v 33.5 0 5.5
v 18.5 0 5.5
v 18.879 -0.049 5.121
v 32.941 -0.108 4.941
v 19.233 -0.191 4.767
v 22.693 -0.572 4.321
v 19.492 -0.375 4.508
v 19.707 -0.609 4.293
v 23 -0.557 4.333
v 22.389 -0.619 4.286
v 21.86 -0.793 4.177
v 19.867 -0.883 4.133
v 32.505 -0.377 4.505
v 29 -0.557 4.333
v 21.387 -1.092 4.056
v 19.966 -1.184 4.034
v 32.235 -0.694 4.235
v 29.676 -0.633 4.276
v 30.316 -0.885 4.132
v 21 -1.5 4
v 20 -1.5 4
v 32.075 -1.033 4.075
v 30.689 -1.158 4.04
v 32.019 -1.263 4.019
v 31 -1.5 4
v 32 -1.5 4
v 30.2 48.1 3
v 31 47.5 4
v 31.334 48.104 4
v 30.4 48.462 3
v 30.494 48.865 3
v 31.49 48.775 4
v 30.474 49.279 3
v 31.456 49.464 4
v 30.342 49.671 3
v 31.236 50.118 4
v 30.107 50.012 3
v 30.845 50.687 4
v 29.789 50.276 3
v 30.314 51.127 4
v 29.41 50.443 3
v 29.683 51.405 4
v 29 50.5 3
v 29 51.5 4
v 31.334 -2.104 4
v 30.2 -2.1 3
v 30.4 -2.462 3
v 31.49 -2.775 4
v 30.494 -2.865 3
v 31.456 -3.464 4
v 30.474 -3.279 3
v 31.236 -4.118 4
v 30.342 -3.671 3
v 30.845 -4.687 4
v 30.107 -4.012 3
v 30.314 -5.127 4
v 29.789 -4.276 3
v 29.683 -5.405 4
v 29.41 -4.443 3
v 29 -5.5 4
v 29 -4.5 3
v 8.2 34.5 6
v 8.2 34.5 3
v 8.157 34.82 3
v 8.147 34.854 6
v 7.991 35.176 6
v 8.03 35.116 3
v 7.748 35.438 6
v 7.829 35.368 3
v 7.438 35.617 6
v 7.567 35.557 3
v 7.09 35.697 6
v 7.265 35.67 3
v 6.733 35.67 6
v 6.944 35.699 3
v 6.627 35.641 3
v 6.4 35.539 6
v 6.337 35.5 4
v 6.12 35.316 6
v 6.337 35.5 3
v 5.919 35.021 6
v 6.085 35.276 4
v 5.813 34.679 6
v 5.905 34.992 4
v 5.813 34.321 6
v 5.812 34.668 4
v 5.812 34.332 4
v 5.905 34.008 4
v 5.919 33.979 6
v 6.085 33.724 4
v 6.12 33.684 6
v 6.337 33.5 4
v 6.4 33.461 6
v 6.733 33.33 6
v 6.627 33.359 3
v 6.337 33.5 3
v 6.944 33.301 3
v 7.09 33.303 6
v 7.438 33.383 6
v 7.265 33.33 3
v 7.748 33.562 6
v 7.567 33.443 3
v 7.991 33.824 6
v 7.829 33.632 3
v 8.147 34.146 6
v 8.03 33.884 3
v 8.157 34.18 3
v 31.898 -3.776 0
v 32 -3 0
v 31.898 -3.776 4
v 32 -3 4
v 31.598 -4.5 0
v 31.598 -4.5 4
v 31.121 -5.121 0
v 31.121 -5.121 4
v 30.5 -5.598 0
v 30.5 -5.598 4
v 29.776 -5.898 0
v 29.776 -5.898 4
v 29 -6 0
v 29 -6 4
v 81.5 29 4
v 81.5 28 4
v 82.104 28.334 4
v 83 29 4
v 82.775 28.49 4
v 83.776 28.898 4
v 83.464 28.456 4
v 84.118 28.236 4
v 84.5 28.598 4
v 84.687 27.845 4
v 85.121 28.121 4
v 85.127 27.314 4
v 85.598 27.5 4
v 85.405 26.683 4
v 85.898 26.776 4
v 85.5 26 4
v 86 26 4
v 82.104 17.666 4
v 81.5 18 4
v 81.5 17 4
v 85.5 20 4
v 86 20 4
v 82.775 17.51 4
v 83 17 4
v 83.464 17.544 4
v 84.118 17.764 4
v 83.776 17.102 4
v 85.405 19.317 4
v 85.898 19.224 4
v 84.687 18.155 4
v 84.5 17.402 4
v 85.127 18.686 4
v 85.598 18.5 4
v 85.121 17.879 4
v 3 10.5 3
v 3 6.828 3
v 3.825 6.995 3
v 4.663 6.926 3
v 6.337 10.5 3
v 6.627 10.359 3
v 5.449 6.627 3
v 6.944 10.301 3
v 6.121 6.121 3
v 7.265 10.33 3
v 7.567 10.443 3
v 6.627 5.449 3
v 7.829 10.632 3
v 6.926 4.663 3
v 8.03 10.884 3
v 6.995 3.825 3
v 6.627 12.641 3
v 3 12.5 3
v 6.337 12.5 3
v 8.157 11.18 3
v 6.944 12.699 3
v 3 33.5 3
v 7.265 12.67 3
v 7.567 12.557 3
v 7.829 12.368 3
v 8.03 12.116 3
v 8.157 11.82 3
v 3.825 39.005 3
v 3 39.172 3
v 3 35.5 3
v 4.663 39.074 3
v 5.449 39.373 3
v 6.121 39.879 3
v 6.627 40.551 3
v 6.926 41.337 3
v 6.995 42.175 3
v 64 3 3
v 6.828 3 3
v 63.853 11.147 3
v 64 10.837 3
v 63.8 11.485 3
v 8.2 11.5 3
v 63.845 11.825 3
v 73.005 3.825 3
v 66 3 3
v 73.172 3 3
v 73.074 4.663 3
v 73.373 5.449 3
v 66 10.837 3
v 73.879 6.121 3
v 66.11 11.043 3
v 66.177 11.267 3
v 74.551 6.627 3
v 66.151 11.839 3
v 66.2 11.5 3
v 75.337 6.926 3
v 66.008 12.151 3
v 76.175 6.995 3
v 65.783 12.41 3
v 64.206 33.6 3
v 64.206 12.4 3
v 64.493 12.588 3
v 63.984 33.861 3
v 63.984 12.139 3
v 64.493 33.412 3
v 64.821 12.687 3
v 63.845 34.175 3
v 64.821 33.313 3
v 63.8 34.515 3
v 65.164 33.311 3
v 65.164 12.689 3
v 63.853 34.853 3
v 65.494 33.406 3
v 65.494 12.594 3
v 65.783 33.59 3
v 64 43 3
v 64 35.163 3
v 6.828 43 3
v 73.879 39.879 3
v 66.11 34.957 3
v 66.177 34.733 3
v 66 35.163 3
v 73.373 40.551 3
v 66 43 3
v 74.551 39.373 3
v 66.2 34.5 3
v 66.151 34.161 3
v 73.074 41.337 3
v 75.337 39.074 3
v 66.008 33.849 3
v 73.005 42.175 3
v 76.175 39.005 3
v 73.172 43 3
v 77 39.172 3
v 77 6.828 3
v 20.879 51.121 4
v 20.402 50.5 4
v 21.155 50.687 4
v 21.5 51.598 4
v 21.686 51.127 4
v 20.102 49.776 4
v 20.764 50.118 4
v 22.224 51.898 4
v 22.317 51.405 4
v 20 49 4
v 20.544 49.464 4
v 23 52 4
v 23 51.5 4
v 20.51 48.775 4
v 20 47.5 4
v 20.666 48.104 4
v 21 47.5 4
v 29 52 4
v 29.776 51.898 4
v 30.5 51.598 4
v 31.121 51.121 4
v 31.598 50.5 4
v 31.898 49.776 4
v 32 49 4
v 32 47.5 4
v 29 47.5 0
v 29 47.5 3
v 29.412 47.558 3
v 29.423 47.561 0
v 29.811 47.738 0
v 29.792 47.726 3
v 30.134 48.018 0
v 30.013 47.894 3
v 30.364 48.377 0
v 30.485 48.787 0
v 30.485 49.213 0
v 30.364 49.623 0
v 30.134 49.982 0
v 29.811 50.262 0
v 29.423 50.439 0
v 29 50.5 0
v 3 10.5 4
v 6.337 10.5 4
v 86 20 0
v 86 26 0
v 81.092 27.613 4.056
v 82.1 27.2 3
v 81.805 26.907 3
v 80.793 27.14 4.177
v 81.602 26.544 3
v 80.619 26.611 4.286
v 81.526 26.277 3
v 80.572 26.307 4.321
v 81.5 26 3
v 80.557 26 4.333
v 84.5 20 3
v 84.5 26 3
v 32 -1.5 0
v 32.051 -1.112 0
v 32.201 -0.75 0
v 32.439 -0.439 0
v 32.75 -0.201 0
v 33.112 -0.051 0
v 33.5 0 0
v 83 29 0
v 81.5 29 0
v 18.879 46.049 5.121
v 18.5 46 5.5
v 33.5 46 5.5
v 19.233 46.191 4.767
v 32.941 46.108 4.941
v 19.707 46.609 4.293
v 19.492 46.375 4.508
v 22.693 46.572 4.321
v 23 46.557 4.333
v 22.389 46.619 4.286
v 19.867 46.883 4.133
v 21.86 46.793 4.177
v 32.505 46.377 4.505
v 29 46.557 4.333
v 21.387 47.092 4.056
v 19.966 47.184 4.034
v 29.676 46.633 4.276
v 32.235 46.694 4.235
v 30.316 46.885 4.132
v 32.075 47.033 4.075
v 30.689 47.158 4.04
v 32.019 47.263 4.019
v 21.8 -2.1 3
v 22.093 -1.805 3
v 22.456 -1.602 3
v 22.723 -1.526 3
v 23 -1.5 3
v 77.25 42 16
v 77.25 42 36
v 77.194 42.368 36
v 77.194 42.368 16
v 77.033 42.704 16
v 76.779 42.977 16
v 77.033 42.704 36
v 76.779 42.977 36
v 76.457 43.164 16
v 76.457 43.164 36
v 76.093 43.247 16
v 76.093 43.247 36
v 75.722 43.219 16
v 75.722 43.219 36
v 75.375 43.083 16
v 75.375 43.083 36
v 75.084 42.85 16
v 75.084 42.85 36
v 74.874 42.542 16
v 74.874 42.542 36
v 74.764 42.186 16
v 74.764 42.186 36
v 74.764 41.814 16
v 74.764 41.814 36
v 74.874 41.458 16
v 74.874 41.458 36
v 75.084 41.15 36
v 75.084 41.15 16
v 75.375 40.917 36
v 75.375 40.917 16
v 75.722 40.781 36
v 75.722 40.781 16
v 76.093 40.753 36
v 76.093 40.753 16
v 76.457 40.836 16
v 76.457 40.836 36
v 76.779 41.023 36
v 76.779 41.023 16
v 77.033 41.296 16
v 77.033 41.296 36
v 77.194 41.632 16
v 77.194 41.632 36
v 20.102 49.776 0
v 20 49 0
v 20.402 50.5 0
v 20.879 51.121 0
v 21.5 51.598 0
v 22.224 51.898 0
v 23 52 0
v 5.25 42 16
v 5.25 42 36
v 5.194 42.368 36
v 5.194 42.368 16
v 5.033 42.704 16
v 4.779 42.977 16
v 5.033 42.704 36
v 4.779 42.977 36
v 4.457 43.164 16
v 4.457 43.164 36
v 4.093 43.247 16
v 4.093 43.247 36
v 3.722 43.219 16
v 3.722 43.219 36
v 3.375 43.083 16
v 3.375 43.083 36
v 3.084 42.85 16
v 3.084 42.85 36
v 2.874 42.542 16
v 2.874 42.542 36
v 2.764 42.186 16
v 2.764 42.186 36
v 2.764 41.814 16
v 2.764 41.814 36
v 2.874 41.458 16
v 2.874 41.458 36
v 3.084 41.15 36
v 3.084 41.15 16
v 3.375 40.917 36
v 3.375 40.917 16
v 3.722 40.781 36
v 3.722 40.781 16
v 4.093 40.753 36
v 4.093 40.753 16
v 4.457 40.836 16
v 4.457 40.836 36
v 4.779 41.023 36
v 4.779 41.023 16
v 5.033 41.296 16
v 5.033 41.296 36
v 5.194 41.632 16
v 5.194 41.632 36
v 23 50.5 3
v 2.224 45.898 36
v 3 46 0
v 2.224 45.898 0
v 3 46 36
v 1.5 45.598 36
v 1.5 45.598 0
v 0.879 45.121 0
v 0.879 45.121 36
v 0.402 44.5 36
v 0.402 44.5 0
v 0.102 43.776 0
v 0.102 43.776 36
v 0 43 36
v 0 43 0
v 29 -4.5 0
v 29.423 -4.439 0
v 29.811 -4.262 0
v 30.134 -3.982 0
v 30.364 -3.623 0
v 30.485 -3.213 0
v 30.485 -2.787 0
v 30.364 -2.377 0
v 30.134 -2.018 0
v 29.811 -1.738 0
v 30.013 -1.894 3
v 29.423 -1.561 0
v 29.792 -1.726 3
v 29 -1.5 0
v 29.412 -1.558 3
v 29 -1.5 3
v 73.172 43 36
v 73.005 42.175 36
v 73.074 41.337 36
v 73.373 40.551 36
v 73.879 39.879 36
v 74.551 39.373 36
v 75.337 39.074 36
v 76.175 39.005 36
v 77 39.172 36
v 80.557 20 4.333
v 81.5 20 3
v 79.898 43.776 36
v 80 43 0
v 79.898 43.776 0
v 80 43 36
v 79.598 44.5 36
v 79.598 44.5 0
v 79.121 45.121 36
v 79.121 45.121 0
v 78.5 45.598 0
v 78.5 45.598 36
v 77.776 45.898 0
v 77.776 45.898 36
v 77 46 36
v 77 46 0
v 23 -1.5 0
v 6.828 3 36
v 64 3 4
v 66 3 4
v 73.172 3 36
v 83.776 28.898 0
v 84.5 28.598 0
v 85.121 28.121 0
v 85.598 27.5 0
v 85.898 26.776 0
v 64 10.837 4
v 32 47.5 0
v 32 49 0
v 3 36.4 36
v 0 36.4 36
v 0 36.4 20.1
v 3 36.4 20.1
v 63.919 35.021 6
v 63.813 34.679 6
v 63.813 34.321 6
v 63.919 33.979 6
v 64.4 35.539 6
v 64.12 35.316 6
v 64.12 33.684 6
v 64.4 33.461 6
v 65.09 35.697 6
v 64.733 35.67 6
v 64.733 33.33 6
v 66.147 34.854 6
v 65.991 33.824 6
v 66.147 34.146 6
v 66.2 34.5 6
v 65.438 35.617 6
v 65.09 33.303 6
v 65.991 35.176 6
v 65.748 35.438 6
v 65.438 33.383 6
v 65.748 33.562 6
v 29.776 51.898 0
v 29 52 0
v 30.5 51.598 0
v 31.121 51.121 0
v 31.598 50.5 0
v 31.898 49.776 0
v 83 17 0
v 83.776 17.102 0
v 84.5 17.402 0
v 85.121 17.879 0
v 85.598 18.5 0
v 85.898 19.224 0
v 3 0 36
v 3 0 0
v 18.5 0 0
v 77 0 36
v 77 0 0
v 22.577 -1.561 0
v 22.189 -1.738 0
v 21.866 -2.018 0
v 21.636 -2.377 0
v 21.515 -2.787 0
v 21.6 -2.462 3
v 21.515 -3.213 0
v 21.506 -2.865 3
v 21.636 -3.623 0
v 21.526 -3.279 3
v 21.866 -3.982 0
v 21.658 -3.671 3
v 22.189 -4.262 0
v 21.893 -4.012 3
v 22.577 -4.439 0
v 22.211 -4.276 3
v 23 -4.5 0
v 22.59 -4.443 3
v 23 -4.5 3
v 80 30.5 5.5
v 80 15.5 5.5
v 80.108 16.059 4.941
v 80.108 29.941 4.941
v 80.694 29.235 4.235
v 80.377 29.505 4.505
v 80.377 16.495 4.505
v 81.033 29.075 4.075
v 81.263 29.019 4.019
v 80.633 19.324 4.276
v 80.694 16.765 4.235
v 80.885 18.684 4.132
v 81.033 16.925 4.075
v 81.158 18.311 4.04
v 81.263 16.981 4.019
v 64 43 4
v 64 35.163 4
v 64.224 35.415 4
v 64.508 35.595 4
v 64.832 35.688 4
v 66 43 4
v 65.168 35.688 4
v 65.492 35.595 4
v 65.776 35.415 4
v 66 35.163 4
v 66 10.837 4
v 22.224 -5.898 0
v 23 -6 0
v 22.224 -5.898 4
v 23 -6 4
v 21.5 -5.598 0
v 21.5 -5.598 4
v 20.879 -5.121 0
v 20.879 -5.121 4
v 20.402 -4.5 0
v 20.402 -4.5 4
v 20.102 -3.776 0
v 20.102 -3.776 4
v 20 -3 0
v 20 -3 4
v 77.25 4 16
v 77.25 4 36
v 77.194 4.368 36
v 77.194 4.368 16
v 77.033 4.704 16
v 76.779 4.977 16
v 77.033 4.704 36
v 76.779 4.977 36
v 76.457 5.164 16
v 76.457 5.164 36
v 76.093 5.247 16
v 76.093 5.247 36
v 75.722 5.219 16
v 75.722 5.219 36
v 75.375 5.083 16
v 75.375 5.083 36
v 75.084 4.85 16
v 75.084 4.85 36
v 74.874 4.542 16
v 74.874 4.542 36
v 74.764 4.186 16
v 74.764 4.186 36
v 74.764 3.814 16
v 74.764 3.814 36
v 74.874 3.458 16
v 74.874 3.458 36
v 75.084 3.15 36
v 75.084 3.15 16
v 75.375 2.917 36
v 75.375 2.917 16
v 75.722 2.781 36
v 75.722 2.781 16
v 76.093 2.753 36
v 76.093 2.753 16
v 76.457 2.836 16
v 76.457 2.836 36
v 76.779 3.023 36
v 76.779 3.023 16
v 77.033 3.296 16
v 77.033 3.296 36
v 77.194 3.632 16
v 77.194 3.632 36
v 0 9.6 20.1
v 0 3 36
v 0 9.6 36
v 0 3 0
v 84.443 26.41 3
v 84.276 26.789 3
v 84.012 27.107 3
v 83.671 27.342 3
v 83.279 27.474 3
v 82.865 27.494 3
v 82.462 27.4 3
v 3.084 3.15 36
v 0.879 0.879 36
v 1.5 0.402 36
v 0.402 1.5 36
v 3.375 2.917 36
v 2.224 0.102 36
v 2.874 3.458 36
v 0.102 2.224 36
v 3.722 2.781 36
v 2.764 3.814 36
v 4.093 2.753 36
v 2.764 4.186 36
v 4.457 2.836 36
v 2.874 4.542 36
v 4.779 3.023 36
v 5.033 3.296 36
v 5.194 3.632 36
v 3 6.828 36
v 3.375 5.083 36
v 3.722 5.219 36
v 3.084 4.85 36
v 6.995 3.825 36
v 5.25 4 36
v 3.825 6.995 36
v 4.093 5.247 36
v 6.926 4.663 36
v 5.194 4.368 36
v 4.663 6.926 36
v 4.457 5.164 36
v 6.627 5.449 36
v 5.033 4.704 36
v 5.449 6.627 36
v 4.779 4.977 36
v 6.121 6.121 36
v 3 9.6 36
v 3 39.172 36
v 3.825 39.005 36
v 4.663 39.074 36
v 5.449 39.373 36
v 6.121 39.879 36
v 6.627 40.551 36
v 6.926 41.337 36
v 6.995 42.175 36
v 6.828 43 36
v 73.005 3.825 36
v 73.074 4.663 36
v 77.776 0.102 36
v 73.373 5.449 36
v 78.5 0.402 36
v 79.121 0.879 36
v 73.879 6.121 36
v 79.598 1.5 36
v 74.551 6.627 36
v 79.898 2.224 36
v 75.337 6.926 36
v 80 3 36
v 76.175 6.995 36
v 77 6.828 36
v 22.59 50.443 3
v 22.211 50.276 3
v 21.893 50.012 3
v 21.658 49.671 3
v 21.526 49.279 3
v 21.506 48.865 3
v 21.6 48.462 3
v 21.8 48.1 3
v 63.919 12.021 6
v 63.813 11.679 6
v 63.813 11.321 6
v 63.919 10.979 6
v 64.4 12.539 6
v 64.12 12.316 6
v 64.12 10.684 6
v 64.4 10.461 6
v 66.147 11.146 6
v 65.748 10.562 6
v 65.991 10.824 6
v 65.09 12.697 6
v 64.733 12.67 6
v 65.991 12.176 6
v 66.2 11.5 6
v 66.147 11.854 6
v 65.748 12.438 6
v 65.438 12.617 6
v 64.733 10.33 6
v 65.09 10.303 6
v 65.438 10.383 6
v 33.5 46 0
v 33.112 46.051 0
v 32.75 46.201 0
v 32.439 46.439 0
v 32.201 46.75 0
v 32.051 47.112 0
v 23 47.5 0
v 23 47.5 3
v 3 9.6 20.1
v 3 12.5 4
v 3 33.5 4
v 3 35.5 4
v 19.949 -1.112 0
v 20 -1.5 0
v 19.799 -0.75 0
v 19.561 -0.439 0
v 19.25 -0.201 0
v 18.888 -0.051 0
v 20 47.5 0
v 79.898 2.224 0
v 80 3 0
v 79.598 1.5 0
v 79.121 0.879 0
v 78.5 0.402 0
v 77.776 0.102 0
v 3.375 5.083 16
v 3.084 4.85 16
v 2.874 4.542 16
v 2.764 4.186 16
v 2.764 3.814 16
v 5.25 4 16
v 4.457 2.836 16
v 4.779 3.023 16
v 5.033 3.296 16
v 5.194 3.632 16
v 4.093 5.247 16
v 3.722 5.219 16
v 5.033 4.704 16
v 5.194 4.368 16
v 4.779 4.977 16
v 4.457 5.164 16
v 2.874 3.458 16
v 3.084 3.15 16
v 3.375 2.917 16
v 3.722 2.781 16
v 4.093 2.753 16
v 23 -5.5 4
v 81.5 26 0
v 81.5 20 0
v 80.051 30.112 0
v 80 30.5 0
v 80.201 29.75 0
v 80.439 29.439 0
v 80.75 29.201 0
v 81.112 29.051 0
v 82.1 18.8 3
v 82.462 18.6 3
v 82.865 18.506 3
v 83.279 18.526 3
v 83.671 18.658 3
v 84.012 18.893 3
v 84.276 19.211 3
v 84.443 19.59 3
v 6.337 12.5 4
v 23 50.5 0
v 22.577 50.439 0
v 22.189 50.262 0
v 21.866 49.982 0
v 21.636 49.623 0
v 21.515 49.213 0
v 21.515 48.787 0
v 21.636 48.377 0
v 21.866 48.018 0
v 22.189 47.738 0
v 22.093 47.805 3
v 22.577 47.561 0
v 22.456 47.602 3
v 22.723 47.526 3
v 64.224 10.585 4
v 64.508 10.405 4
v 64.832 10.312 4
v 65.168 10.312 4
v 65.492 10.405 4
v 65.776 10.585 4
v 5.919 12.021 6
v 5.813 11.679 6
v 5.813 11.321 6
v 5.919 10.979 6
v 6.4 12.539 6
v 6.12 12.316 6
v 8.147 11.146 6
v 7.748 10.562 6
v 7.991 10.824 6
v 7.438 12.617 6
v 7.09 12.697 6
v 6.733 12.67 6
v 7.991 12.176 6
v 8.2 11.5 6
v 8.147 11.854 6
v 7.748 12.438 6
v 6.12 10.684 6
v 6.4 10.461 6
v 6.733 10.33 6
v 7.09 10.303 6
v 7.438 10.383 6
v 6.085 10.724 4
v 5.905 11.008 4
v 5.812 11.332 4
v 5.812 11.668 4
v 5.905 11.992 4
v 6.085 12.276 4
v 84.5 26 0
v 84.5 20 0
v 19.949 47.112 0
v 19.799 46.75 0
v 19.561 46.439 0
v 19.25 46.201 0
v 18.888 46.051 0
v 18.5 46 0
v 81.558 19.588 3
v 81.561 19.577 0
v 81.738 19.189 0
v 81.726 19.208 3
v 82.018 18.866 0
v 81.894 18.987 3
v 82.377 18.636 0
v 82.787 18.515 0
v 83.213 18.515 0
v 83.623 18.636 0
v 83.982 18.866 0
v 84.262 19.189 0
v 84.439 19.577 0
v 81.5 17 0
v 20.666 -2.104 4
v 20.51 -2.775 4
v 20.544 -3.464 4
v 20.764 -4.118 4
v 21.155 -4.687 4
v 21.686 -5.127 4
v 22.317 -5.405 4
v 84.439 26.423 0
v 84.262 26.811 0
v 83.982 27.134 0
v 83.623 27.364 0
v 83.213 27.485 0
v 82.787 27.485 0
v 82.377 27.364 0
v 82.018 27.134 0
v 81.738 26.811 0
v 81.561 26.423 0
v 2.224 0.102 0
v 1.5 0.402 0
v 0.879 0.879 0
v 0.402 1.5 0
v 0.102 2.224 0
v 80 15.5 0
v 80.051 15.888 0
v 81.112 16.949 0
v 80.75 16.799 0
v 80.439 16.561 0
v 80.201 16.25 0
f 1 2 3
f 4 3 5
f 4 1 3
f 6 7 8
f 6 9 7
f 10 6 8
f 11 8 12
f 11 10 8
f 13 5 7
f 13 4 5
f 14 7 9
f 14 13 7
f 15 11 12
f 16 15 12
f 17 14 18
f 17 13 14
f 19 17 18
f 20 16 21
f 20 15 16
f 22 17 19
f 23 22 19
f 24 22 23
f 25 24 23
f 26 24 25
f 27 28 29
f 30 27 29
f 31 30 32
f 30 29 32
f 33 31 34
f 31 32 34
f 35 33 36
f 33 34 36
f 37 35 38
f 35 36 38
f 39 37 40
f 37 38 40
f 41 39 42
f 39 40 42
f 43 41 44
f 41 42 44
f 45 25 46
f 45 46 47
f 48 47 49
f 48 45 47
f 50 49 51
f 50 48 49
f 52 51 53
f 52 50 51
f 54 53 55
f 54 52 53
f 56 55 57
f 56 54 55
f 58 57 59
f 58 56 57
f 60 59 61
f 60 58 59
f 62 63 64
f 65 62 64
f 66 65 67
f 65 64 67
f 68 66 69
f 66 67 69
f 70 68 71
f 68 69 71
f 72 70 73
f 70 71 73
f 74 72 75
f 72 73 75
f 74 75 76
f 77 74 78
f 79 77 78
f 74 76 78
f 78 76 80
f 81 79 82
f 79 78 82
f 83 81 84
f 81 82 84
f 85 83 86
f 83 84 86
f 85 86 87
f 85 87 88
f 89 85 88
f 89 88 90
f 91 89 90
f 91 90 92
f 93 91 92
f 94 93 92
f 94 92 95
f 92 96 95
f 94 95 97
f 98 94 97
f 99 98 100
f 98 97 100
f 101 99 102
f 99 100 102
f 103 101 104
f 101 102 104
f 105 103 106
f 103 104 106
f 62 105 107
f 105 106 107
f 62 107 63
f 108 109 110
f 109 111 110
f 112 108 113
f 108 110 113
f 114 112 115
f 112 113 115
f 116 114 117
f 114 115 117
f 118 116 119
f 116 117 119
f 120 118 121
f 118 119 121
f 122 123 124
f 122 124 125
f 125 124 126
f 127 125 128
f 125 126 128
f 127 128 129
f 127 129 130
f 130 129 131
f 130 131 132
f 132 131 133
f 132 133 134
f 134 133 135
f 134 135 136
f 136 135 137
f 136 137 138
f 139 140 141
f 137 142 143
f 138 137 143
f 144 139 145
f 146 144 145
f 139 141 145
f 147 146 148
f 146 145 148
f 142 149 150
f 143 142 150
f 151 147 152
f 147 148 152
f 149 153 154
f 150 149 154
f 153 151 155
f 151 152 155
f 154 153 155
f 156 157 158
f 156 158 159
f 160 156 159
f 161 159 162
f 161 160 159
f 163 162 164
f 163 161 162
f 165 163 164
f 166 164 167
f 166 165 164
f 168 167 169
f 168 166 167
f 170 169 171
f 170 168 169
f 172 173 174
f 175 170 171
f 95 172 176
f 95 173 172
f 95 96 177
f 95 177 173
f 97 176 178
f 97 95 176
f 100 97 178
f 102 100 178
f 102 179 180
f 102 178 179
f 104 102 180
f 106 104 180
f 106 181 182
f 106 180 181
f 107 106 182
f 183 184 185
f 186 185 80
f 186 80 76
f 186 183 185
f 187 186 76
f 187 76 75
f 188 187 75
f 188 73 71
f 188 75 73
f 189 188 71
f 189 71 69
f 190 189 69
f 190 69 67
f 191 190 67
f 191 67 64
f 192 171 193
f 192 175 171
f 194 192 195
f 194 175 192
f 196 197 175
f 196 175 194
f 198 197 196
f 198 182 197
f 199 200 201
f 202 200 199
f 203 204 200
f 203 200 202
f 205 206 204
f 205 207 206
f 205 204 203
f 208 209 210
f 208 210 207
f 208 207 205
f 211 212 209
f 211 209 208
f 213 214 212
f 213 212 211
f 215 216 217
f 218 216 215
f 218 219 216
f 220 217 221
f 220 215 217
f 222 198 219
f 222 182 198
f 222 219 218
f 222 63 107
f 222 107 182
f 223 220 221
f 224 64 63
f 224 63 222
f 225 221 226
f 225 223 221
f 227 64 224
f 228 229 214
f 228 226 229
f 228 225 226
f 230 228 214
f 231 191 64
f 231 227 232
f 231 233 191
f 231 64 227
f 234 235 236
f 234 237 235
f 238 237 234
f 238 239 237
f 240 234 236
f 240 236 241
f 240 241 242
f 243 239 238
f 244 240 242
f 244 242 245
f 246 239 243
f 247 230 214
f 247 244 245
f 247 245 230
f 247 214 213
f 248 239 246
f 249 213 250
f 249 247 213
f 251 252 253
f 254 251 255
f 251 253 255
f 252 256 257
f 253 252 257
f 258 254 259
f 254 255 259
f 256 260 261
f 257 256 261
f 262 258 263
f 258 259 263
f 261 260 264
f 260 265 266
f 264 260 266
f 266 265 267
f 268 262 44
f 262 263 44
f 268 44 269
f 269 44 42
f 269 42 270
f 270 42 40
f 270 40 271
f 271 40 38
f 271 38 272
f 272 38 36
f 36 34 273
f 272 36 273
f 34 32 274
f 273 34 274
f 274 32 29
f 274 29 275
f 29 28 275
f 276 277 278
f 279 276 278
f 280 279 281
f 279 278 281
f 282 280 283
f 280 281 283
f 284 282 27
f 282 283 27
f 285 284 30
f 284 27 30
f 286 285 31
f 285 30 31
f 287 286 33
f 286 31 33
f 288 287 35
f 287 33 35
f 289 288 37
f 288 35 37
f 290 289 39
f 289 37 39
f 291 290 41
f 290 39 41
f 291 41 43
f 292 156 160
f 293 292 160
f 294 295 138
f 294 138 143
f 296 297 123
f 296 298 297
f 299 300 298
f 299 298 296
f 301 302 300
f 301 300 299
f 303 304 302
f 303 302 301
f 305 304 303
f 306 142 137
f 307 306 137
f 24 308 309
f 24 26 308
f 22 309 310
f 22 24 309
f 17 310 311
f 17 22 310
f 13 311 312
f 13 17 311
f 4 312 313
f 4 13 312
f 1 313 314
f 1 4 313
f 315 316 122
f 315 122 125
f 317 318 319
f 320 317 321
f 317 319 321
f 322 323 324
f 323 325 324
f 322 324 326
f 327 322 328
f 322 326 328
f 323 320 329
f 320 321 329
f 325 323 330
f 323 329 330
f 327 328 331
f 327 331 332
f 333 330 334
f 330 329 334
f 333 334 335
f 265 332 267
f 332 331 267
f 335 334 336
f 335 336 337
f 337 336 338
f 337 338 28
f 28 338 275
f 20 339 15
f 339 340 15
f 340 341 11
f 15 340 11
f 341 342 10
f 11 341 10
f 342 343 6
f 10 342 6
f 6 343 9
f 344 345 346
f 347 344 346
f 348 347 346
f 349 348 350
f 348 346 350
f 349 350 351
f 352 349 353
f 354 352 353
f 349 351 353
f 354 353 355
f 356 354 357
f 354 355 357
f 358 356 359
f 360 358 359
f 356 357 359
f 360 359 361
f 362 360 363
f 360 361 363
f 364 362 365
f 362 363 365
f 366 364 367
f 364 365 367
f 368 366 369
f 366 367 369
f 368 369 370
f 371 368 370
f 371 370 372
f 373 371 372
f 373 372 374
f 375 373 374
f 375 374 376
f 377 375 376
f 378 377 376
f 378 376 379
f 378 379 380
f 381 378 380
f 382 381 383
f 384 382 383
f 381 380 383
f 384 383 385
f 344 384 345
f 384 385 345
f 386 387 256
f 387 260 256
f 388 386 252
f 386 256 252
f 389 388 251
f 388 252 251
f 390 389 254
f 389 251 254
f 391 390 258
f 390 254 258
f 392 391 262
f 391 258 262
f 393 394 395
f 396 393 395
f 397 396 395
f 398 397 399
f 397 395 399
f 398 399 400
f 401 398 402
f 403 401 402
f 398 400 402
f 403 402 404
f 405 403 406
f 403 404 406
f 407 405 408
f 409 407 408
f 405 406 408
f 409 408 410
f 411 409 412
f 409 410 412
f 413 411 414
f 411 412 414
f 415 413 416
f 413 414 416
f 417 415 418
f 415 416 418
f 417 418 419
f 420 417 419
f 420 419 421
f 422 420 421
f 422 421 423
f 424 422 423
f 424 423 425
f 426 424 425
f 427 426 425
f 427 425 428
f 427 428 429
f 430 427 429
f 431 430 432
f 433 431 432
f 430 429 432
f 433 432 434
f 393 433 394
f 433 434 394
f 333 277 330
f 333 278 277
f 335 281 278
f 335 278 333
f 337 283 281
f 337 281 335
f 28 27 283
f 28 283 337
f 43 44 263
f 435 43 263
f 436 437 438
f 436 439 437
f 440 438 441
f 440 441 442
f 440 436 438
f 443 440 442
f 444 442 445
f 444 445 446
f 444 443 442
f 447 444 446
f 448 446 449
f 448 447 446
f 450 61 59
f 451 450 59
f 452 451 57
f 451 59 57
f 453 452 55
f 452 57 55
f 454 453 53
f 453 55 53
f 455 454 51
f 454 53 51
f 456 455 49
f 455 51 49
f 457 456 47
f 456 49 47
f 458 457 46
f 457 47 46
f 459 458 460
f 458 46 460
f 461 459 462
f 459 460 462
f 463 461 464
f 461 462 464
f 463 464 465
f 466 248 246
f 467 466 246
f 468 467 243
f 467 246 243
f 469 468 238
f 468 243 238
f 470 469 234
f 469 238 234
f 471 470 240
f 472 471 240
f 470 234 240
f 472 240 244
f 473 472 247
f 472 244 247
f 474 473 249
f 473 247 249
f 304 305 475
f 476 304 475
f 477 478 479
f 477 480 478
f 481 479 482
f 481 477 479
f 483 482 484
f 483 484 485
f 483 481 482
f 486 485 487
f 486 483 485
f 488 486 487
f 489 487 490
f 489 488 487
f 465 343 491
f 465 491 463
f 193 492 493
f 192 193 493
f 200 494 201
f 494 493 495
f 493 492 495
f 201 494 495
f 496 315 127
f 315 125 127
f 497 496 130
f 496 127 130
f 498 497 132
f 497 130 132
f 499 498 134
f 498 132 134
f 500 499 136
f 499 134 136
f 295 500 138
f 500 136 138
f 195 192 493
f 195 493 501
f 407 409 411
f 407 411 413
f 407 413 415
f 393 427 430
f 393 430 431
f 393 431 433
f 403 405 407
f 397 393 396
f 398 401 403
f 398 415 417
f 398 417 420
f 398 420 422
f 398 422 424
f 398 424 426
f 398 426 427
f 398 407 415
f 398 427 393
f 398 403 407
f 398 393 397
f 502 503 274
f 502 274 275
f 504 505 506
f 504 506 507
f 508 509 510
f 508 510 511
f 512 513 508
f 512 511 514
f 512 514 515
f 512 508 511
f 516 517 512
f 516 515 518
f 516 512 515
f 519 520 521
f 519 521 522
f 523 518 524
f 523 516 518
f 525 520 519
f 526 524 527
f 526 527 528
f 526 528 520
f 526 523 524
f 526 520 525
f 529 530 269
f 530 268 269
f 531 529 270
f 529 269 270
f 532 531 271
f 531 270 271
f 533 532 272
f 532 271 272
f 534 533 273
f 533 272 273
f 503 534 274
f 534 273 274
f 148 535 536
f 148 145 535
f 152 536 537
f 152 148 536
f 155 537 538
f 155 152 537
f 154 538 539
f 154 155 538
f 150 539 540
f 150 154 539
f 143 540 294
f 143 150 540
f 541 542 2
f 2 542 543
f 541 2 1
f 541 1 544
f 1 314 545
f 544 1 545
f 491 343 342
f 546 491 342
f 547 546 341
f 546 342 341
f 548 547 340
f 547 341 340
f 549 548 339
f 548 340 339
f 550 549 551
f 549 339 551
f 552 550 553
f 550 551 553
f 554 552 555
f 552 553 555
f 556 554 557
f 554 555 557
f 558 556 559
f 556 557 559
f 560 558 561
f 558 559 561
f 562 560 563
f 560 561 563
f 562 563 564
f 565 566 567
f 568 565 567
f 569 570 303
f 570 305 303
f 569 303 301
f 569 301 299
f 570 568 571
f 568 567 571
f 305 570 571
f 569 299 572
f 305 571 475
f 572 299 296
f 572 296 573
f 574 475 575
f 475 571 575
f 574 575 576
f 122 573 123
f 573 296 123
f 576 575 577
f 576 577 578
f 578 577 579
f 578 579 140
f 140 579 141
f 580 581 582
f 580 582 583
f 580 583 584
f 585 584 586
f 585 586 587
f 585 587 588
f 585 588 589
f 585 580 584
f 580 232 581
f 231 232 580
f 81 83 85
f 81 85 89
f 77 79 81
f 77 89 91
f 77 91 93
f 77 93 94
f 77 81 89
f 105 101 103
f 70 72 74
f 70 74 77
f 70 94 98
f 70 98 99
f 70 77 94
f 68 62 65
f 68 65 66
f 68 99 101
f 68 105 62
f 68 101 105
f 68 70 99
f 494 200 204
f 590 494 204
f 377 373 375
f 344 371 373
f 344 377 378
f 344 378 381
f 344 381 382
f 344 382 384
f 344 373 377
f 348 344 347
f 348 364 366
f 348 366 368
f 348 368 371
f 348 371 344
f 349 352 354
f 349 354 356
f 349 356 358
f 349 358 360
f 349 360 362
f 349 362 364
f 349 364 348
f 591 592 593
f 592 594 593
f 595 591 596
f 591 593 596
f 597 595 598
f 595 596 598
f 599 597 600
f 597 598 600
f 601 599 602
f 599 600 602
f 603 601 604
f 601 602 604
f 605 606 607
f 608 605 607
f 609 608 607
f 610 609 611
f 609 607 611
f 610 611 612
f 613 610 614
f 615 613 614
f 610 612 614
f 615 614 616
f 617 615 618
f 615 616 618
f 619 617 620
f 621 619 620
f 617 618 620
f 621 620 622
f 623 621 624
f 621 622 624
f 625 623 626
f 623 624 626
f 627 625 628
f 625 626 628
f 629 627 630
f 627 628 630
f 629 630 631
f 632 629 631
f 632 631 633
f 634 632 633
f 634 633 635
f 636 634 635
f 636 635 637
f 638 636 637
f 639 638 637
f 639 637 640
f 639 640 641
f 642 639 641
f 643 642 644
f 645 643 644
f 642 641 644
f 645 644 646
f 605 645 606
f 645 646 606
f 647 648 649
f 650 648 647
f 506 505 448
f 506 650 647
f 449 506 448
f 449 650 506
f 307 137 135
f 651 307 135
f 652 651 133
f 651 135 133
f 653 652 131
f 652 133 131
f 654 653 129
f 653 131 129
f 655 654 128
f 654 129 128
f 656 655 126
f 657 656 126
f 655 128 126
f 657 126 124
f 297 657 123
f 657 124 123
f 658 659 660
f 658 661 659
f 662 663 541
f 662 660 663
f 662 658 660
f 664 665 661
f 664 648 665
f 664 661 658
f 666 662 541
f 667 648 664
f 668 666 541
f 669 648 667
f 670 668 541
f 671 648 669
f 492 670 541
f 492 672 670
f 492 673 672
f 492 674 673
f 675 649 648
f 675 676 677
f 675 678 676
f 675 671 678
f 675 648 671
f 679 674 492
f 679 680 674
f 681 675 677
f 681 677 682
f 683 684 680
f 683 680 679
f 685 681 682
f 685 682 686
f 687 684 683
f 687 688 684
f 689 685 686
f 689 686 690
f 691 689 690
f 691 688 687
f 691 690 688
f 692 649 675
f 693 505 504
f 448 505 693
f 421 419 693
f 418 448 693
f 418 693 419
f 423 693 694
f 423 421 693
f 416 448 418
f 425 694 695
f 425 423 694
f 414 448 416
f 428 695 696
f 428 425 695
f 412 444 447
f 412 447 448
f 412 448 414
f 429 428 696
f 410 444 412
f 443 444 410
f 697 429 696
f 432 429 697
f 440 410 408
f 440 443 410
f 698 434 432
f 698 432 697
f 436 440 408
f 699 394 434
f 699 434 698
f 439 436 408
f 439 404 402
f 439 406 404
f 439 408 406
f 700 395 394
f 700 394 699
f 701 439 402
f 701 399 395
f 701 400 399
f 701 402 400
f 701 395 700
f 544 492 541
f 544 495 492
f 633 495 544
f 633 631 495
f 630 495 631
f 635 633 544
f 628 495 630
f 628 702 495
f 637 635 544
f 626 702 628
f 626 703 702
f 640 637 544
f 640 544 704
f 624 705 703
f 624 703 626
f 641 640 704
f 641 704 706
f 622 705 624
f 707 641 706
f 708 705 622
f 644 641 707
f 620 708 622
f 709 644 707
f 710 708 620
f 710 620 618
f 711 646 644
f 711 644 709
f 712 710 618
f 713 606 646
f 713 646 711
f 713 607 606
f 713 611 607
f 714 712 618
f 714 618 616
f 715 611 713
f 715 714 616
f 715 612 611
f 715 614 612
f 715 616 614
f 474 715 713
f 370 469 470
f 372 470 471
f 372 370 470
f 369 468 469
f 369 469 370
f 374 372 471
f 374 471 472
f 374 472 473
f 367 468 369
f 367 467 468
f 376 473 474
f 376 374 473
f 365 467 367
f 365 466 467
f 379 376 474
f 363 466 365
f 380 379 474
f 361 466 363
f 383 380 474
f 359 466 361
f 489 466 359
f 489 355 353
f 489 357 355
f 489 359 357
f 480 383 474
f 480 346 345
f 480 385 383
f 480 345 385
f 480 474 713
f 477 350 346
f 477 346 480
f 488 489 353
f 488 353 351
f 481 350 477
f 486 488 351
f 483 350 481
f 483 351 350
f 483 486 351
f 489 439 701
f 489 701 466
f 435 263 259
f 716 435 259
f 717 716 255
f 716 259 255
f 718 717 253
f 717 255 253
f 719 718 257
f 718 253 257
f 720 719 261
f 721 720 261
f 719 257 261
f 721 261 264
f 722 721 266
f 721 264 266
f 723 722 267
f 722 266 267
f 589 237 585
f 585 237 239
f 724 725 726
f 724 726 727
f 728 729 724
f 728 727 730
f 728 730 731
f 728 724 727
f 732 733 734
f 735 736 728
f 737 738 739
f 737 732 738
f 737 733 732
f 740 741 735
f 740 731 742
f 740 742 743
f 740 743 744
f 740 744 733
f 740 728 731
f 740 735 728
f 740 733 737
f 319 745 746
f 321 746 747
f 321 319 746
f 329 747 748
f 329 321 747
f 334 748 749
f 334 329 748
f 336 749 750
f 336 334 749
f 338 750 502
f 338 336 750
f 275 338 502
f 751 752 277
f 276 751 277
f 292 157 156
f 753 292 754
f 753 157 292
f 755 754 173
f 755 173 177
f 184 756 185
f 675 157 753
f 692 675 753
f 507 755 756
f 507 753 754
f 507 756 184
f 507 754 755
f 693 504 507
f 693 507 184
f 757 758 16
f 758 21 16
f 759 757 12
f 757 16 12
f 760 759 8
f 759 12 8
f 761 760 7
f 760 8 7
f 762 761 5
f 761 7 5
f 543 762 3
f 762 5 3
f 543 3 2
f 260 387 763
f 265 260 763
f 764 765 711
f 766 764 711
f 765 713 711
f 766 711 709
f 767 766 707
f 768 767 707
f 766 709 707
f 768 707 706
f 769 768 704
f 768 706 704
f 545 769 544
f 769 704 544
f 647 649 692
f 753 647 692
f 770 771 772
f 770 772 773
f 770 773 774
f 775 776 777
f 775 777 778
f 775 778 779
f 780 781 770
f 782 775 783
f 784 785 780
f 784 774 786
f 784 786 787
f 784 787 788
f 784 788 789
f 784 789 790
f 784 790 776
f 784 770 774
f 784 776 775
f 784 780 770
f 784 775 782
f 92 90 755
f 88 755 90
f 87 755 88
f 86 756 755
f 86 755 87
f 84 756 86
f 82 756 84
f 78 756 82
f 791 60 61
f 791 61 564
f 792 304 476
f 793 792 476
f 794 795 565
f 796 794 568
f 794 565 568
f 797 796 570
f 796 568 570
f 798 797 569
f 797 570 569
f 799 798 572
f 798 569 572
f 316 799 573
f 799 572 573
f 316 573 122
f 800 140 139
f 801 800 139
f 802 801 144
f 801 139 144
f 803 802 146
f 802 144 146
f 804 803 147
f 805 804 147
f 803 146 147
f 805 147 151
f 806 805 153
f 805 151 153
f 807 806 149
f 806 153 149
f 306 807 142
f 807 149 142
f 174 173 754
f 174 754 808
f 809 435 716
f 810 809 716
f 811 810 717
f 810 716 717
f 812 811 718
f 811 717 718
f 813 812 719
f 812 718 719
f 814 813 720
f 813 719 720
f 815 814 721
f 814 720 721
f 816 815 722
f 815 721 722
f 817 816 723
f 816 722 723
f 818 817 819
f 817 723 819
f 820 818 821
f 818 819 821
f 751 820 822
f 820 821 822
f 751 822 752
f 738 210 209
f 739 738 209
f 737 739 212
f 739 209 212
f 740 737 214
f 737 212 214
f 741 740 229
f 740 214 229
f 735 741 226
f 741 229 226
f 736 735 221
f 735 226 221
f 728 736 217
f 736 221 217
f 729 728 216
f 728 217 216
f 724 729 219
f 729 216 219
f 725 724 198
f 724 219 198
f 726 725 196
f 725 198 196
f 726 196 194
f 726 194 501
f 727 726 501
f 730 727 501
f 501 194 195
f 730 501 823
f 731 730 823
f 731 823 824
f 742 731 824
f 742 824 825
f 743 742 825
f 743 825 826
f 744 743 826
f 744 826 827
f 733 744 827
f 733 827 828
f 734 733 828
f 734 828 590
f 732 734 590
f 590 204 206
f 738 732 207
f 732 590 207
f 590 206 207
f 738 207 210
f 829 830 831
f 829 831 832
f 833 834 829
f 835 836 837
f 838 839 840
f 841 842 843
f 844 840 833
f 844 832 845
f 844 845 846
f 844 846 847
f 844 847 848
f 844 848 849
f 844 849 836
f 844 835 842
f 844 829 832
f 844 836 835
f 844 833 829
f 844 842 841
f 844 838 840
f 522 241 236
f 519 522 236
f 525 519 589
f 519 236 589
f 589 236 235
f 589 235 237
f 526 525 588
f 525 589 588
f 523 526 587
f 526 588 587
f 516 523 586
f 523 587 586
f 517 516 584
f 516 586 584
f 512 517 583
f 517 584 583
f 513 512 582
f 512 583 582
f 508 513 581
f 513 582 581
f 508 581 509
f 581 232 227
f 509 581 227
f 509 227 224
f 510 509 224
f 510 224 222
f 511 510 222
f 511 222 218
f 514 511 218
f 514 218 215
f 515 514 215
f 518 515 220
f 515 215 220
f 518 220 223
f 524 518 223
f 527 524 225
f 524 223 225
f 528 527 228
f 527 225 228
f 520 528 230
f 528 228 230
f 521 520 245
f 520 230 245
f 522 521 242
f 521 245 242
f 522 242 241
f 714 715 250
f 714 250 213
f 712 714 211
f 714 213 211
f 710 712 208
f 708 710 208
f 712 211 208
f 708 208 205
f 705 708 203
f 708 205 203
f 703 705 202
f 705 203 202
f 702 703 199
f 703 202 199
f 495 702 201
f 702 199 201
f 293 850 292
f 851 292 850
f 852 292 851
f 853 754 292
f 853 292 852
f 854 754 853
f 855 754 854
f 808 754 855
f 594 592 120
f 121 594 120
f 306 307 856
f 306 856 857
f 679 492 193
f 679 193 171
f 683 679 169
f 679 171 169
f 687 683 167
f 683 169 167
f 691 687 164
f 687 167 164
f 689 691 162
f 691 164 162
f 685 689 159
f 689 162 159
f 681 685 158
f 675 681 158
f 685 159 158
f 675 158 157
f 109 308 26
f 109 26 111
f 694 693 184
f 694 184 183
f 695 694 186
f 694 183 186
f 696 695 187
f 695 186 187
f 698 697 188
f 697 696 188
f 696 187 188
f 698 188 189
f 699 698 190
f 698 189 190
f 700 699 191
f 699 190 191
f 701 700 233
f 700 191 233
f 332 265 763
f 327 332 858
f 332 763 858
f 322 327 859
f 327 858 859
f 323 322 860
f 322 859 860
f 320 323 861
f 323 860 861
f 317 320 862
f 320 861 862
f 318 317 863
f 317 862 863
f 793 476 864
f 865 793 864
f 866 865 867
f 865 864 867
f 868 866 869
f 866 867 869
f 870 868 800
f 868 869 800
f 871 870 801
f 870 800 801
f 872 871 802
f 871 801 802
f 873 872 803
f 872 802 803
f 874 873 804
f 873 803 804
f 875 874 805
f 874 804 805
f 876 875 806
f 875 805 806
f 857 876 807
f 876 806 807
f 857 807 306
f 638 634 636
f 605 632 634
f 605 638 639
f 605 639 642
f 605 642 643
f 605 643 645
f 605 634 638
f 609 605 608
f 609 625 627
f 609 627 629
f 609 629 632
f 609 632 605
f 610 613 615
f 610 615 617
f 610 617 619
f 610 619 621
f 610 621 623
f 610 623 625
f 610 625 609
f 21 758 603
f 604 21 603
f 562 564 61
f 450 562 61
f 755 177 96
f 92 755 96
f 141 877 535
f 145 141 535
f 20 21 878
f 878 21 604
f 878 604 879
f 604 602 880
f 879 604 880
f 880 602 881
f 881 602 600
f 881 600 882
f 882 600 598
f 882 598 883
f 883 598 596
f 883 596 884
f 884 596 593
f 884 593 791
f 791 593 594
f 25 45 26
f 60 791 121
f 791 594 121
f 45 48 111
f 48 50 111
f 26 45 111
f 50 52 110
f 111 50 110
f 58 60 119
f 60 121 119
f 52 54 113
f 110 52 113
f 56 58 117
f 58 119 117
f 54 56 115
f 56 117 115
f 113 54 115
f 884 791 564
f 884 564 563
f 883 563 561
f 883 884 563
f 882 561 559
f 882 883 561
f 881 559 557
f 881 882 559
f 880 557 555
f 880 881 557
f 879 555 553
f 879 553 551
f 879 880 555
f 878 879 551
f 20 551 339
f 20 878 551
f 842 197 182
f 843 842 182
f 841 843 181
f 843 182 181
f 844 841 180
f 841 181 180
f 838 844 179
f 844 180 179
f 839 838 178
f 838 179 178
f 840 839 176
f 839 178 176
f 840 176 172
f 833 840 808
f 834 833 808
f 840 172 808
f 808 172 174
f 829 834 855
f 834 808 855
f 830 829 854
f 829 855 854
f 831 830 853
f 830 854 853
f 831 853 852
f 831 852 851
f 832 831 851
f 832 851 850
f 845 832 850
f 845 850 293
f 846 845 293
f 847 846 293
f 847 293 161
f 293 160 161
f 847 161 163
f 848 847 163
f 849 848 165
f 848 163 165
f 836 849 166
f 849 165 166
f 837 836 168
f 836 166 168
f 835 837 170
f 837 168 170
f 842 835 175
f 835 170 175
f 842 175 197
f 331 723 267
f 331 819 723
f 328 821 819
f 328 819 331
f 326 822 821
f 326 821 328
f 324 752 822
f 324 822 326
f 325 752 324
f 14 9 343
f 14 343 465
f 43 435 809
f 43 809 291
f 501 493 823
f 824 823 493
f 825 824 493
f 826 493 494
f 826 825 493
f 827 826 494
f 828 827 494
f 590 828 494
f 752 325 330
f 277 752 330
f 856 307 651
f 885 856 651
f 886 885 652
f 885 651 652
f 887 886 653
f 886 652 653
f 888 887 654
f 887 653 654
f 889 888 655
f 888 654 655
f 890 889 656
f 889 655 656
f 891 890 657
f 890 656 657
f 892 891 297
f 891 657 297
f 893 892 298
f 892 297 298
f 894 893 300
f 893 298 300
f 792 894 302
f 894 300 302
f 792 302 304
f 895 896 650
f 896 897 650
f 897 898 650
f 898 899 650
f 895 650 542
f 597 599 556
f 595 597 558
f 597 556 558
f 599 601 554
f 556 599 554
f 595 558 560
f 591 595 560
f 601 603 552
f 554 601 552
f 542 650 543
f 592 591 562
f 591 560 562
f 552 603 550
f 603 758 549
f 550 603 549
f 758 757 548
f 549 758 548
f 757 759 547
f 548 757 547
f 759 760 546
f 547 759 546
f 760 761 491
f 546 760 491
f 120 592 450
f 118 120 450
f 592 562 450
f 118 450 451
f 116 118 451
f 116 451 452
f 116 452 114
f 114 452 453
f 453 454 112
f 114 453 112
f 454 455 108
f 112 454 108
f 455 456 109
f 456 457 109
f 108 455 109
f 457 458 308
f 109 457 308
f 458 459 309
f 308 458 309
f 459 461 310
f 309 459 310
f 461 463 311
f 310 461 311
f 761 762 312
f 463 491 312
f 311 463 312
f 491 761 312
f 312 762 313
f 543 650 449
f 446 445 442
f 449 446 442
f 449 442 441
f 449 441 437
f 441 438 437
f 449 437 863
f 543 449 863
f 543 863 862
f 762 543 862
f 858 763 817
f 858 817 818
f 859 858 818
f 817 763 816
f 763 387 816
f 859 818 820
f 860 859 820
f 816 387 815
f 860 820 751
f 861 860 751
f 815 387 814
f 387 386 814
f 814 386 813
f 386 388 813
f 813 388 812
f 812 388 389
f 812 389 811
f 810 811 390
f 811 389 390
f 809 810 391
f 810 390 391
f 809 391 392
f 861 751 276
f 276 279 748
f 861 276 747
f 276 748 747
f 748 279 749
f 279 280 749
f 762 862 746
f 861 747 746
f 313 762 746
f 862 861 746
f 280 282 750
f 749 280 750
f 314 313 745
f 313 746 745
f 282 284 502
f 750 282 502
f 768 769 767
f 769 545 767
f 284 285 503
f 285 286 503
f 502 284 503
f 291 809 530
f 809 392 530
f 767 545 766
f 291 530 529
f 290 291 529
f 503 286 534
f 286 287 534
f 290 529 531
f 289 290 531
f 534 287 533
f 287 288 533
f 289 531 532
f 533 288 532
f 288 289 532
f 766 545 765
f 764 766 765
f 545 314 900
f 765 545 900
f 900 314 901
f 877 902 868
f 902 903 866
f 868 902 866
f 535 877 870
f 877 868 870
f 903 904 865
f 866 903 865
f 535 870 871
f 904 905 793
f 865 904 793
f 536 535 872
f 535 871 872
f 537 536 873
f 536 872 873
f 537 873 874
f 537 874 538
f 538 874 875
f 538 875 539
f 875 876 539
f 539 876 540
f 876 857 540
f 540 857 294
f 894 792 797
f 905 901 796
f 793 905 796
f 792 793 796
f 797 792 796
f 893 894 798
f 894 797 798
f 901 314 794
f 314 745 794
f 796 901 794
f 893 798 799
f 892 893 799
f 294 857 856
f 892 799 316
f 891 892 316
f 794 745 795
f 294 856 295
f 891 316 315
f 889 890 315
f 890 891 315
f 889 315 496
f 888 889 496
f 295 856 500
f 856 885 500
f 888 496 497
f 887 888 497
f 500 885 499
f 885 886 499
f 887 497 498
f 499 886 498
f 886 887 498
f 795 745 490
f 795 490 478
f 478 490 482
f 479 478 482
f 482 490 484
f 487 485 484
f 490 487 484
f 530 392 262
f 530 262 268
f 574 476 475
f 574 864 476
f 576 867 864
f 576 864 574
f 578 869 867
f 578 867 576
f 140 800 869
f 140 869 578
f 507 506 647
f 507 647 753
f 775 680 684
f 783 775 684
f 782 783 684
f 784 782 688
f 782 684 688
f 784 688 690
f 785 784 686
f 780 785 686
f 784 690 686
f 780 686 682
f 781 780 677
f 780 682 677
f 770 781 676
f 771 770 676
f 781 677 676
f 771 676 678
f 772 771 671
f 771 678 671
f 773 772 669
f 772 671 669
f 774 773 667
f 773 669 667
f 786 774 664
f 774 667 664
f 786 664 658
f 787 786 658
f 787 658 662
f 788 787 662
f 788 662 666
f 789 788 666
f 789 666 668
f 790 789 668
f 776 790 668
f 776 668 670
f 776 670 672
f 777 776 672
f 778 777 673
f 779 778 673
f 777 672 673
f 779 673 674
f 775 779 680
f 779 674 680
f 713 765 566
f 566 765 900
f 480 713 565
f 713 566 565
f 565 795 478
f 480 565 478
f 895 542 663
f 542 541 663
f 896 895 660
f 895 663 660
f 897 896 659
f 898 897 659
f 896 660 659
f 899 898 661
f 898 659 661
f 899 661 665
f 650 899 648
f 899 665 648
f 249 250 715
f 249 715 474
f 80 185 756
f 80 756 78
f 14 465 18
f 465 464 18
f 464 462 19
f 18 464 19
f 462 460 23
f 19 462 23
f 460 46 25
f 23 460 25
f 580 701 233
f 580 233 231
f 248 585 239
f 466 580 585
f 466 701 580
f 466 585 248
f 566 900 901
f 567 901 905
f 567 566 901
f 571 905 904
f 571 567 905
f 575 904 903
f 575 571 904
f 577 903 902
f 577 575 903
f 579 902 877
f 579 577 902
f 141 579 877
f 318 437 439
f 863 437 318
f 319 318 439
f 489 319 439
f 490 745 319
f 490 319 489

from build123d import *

# Parameters (mm, degrees)
SKETCH_W        = 80
SKETCH_H        = 46
PAD_DEPTH       = 36
SKETCH001_W     = 74
SKETCH001_H     = 40
POCKET_DEPTH    = 33
SKETCH002_W     = 3
SKETCH002_H     = 26.8
POCKET001_DEPTH = 15.9
SKETCH003_R     = 3
PAD001_DEPTH    = 33
SKETCH006_R     = 1.25
POCKET002_DEPTH = 20
SKETCH007_R     = 1.2
PAD002_DEPTH    = 3
SKETCH008_W     = 3.5
SKETCH008_H     = 2
SKETCH008_W_2   = 2
SKETCH008_H_2   = 8
PAD003_DEPTH    = 1
FILLET_R        = 3
FILLET001_R     = 3
FILLET002_R     = 3
SKETCH009_W     = 12
SKETCH009_H     = 6
SKETCH009_W_2   = 6
SKETCH009_H_2   = 12
PAD004_DEPTH    = 4
FILLET003_R     = 1.5
FILLET004_R     = 3
FILLET005_R     = 1.5
FILLET006_R     = 1.5
FILLET007_R     = 1.5
FILLET008_R     = 3
FILLET009_R     = 3
FILLET010_R     = 1.5
FILLET011_R     = 1.5
POCKET003_DEPTH = 4
CHAMFER_SIZE    = 1
CHAMFER001_SIZE = 1
CHAMFER002_SIZE = 1


with BuildPart() as part:
    # Sketch → Pad (new body)
    with BuildSketch(Plane.XY):
        with Locations((40, 23)):
            Rectangle(SKETCH_W, SKETCH_H)
    extrude(amount=PAD_DEPTH)

    # Sketch001 → Pocket (cut)
    with BuildSketch(Plane.XY.offset(36)):
        with Locations((40, 23)):
            Rectangle(SKETCH001_W, SKETCH001_H)
    extrude(amount=-POCKET_DEPTH, mode=Mode.SUBTRACT)

    # Sketch002 → Pocket001 (cut)
    with BuildSketch(Plane.XY.offset(36)):
        with Locations((1.5, 23)):
            Rectangle(SKETCH002_W, SKETCH002_H)
    extrude(amount=-POCKET001_DEPTH, mode=Mode.SUBTRACT)

    # Sketch003 → Pad001 (new body)
    with BuildSketch(Plane.XY.offset(3)):
        with Locations((4, 42)):
            Circle(SKETCH003_R)
        with Locations((4, 4)):
            Circle(SKETCH003_R)
        with Locations((76, 4)):
            Circle(SKETCH003_R)
        with Locations((76, 42)):
            Circle(SKETCH003_R)
    extrude(amount=PAD001_DEPTH)

    # Sketch006 → Pocket002 (cut)
    with BuildSketch(Plane.XY.offset(36)):
        with Locations((4, 42)):
            Circle(SKETCH006_R)
        with Locations((4, 4)):
            Circle(SKETCH006_R)
        with Locations((76, 4)):
            Circle(SKETCH006_R)
        with Locations((76, 42)):
            Circle(SKETCH006_R)
    extrude(amount=-POCKET002_DEPTH, mode=Mode.SUBTRACT)

    # Sketch007 → Pad002 (new body)
    with BuildSketch(Plane.XY.offset(3)):
        with Locations((7, 11.5)):
            Circle(SKETCH007_R)
        with Locations((7, 34.5)):
            Circle(SKETCH007_R)
        with Locations((65, 34.5)):
            Circle(SKETCH007_R)
        with Locations((65, 11.5)):
            Circle(SKETCH007_R)
    extrude(amount=PAD002_DEPTH)

    # Sketch008 → Pad003 (new body)
    with BuildSketch(Plane.XY.offset(3)):
        with Locations((4.75, 34.5)):
            Rectangle(SKETCH008_W, SKETCH008_H)
        with Locations((4.75, 11.5)):
            Rectangle(SKETCH008_W, SKETCH008_H)
        with Locations((65, 39)):
            Rectangle(SKETCH008_W_2, SKETCH008_H_2)
        with Locations((65, 7)):
            Rectangle(SKETCH008_W_2, SKETCH008_H_2)
    extrude(amount=PAD003_DEPTH)

    # Fillet
    fillet_edges = [part.edges().sort_by_distance(p)[0] for p in [
        (80, 0, 18),
    ]]
    fillet(fillet_edges, radius=FILLET_R)

    # Fillet001
    fillet001_edges = [part.edges().sort_by_distance(p)[0] for p in [
        (80, 46, 18),
    ]]
    fillet(fillet001_edges, radius=FILLET001_R)

    # Fillet002
    fillet002_edges = [part.edges().sort_by_distance(p)[0] for p in [
        (0, 0, 18),
        (0, 46, 18),
    ]]
    fillet(fillet002_edges, radius=FILLET002_R)

    # Sketch009 → Pad004 (new body)
    with BuildSketch(Plane(origin=(0, 0, 0), x_dir=(1, 0, 0), z_dir=(0, 0, -1))):
        with Locations((26, 3)):
            Rectangle(SKETCH009_W, SKETCH009_H)
        with Locations((83, -23)):
            Rectangle(SKETCH009_W_2, SKETCH009_H_2)
        with Locations((26, -49)):
            Rectangle(SKETCH009_W, SKETCH009_H)
    extrude(amount=-PAD004_DEPTH)

    # Fillet003
    fillet003_edges = [part.edges().sort_by_distance(p)[0] for p in [
        (26, 46, 4),
        (32, 46, 2),
    ]]
    fillet(fillet003_edges, radius=FILLET003_R)

    # Fillet004
    fillet004_edges = [part.edges().sort_by_distance(p)[0] for p in [
        (32, 52, 2),
        (20, 52, 2),
    ]]
    fillet(fillet004_edges, radius=FILLET004_R)

    # Fillet005
    fillet005_edges = [part.edges().sort_by_distance(p)[0] for p in [
        (20, 46, 2),
    ]]
    fillet(fillet005_edges, radius=FILLET005_R)

    # Fillet006
    fillet006_edges = [part.edges().sort_by_distance(p)[0] for p in [
        (80, 23, 4),
        (80, 29, 2),
    ]]
    fillet(fillet006_edges, radius=FILLET006_R)

    # Fillet007
    fillet007_edges = [part.edges().sort_by_distance(p)[0] for p in [
        (80, 17, 2),
    ]]
    fillet(fillet007_edges, radius=FILLET007_R)

    # Fillet008
    fillet008_edges = [part.edges().sort_by_distance(p)[0] for p in [
        (86, 17, 2),
        (86, 29, 2),
    ]]
    fillet(fillet008_edges, radius=FILLET008_R)

    # Fillet009
    fillet009_edges = [part.edges().sort_by_distance(p)[0] for p in [
        (32, -6, 2),
        (20, -6, 2),
    ]]
    fillet(fillet009_edges, radius=FILLET009_R)

    # Fillet010
    fillet010_edges = [part.edges().sort_by_distance(p)[0] for p in [
        (26, 0, 4),
        (32, 0, 2),
    ]]
    fillet(fillet010_edges, radius=FILLET010_R)

    # Fillet011
    fillet011_edges = [part.edges().sort_by_distance(p)[0] for p in [
        (20, 0, 2),
    ]]
    fillet(fillet011_edges, radius=FILLET011_R)

    # Sketch010 → Pocket003 (cut)
    with BuildSketch(Plane.XY.offset(4)):
        with BuildLine():
            ThreePointArc((23, 50.5), (21.5, 49), (23, 47.5))
            Line((23, 47.5), (29, 47.5))
            ThreePointArc((29, 47.5), (30.5, 49), (29, 50.5))
            Line((23, 50.5), (29, 50.5))
        make_face()
        with BuildLine():
            ThreePointArc((23, -1.5), (21.5, -3), (23, -4.5))
            Line((23, -4.5), (29, -4.5))
            ThreePointArc((29, -4.5), (30.5, -3), (29, -1.5))
            Line((23, -1.5), (29, -1.5))
        make_face()
        with BuildLine():
            ThreePointArc((84.5, 26), (83, 27.5), (81.5, 26))
            Line((81.5, 26), (81.5, 20))
            ThreePointArc((81.5, 20), (83, 18.5), (84.5, 20))
            Line((84.5, 26), (84.5, 20))
        make_face()
    extrude(amount=-POCKET003_DEPTH, mode=Mode.SUBTRACT)

    # Chamfer
    chamfer_edges = [part.edges().sort_by_distance(p)[0] for p in [
        (21.5, 49, 4),
        (29, 47.5, 2),
        (30.5, 49, 4),
        (26, 47.5, 4),
    ]]
    chamfer(chamfer_edges, length=CHAMFER_SIZE)

    # Chamfer001
    chamfer001_edges = [part.edges().sort_by_distance(p)[0] for p in [
        (26, -1.5, 4),
        (26, -4.5, 4),
        (21.5, -3, 4),
        (29, -4.5, 2),
    ]]
    chamfer(chamfer001_edges, length=CHAMFER001_SIZE)

    # Chamfer002
    chamfer002_edges = [part.edges().sort_by_distance(p)[0] for p in [
        (83, 27.5, 4),
        (84.5, 23, 4),
        (81.5, 23, 4),
        (83, 18.5, 4),
    ]]
    chamfer(chamfer002_edges, length=CHAMFER002_SIZE)


solid = part.part
